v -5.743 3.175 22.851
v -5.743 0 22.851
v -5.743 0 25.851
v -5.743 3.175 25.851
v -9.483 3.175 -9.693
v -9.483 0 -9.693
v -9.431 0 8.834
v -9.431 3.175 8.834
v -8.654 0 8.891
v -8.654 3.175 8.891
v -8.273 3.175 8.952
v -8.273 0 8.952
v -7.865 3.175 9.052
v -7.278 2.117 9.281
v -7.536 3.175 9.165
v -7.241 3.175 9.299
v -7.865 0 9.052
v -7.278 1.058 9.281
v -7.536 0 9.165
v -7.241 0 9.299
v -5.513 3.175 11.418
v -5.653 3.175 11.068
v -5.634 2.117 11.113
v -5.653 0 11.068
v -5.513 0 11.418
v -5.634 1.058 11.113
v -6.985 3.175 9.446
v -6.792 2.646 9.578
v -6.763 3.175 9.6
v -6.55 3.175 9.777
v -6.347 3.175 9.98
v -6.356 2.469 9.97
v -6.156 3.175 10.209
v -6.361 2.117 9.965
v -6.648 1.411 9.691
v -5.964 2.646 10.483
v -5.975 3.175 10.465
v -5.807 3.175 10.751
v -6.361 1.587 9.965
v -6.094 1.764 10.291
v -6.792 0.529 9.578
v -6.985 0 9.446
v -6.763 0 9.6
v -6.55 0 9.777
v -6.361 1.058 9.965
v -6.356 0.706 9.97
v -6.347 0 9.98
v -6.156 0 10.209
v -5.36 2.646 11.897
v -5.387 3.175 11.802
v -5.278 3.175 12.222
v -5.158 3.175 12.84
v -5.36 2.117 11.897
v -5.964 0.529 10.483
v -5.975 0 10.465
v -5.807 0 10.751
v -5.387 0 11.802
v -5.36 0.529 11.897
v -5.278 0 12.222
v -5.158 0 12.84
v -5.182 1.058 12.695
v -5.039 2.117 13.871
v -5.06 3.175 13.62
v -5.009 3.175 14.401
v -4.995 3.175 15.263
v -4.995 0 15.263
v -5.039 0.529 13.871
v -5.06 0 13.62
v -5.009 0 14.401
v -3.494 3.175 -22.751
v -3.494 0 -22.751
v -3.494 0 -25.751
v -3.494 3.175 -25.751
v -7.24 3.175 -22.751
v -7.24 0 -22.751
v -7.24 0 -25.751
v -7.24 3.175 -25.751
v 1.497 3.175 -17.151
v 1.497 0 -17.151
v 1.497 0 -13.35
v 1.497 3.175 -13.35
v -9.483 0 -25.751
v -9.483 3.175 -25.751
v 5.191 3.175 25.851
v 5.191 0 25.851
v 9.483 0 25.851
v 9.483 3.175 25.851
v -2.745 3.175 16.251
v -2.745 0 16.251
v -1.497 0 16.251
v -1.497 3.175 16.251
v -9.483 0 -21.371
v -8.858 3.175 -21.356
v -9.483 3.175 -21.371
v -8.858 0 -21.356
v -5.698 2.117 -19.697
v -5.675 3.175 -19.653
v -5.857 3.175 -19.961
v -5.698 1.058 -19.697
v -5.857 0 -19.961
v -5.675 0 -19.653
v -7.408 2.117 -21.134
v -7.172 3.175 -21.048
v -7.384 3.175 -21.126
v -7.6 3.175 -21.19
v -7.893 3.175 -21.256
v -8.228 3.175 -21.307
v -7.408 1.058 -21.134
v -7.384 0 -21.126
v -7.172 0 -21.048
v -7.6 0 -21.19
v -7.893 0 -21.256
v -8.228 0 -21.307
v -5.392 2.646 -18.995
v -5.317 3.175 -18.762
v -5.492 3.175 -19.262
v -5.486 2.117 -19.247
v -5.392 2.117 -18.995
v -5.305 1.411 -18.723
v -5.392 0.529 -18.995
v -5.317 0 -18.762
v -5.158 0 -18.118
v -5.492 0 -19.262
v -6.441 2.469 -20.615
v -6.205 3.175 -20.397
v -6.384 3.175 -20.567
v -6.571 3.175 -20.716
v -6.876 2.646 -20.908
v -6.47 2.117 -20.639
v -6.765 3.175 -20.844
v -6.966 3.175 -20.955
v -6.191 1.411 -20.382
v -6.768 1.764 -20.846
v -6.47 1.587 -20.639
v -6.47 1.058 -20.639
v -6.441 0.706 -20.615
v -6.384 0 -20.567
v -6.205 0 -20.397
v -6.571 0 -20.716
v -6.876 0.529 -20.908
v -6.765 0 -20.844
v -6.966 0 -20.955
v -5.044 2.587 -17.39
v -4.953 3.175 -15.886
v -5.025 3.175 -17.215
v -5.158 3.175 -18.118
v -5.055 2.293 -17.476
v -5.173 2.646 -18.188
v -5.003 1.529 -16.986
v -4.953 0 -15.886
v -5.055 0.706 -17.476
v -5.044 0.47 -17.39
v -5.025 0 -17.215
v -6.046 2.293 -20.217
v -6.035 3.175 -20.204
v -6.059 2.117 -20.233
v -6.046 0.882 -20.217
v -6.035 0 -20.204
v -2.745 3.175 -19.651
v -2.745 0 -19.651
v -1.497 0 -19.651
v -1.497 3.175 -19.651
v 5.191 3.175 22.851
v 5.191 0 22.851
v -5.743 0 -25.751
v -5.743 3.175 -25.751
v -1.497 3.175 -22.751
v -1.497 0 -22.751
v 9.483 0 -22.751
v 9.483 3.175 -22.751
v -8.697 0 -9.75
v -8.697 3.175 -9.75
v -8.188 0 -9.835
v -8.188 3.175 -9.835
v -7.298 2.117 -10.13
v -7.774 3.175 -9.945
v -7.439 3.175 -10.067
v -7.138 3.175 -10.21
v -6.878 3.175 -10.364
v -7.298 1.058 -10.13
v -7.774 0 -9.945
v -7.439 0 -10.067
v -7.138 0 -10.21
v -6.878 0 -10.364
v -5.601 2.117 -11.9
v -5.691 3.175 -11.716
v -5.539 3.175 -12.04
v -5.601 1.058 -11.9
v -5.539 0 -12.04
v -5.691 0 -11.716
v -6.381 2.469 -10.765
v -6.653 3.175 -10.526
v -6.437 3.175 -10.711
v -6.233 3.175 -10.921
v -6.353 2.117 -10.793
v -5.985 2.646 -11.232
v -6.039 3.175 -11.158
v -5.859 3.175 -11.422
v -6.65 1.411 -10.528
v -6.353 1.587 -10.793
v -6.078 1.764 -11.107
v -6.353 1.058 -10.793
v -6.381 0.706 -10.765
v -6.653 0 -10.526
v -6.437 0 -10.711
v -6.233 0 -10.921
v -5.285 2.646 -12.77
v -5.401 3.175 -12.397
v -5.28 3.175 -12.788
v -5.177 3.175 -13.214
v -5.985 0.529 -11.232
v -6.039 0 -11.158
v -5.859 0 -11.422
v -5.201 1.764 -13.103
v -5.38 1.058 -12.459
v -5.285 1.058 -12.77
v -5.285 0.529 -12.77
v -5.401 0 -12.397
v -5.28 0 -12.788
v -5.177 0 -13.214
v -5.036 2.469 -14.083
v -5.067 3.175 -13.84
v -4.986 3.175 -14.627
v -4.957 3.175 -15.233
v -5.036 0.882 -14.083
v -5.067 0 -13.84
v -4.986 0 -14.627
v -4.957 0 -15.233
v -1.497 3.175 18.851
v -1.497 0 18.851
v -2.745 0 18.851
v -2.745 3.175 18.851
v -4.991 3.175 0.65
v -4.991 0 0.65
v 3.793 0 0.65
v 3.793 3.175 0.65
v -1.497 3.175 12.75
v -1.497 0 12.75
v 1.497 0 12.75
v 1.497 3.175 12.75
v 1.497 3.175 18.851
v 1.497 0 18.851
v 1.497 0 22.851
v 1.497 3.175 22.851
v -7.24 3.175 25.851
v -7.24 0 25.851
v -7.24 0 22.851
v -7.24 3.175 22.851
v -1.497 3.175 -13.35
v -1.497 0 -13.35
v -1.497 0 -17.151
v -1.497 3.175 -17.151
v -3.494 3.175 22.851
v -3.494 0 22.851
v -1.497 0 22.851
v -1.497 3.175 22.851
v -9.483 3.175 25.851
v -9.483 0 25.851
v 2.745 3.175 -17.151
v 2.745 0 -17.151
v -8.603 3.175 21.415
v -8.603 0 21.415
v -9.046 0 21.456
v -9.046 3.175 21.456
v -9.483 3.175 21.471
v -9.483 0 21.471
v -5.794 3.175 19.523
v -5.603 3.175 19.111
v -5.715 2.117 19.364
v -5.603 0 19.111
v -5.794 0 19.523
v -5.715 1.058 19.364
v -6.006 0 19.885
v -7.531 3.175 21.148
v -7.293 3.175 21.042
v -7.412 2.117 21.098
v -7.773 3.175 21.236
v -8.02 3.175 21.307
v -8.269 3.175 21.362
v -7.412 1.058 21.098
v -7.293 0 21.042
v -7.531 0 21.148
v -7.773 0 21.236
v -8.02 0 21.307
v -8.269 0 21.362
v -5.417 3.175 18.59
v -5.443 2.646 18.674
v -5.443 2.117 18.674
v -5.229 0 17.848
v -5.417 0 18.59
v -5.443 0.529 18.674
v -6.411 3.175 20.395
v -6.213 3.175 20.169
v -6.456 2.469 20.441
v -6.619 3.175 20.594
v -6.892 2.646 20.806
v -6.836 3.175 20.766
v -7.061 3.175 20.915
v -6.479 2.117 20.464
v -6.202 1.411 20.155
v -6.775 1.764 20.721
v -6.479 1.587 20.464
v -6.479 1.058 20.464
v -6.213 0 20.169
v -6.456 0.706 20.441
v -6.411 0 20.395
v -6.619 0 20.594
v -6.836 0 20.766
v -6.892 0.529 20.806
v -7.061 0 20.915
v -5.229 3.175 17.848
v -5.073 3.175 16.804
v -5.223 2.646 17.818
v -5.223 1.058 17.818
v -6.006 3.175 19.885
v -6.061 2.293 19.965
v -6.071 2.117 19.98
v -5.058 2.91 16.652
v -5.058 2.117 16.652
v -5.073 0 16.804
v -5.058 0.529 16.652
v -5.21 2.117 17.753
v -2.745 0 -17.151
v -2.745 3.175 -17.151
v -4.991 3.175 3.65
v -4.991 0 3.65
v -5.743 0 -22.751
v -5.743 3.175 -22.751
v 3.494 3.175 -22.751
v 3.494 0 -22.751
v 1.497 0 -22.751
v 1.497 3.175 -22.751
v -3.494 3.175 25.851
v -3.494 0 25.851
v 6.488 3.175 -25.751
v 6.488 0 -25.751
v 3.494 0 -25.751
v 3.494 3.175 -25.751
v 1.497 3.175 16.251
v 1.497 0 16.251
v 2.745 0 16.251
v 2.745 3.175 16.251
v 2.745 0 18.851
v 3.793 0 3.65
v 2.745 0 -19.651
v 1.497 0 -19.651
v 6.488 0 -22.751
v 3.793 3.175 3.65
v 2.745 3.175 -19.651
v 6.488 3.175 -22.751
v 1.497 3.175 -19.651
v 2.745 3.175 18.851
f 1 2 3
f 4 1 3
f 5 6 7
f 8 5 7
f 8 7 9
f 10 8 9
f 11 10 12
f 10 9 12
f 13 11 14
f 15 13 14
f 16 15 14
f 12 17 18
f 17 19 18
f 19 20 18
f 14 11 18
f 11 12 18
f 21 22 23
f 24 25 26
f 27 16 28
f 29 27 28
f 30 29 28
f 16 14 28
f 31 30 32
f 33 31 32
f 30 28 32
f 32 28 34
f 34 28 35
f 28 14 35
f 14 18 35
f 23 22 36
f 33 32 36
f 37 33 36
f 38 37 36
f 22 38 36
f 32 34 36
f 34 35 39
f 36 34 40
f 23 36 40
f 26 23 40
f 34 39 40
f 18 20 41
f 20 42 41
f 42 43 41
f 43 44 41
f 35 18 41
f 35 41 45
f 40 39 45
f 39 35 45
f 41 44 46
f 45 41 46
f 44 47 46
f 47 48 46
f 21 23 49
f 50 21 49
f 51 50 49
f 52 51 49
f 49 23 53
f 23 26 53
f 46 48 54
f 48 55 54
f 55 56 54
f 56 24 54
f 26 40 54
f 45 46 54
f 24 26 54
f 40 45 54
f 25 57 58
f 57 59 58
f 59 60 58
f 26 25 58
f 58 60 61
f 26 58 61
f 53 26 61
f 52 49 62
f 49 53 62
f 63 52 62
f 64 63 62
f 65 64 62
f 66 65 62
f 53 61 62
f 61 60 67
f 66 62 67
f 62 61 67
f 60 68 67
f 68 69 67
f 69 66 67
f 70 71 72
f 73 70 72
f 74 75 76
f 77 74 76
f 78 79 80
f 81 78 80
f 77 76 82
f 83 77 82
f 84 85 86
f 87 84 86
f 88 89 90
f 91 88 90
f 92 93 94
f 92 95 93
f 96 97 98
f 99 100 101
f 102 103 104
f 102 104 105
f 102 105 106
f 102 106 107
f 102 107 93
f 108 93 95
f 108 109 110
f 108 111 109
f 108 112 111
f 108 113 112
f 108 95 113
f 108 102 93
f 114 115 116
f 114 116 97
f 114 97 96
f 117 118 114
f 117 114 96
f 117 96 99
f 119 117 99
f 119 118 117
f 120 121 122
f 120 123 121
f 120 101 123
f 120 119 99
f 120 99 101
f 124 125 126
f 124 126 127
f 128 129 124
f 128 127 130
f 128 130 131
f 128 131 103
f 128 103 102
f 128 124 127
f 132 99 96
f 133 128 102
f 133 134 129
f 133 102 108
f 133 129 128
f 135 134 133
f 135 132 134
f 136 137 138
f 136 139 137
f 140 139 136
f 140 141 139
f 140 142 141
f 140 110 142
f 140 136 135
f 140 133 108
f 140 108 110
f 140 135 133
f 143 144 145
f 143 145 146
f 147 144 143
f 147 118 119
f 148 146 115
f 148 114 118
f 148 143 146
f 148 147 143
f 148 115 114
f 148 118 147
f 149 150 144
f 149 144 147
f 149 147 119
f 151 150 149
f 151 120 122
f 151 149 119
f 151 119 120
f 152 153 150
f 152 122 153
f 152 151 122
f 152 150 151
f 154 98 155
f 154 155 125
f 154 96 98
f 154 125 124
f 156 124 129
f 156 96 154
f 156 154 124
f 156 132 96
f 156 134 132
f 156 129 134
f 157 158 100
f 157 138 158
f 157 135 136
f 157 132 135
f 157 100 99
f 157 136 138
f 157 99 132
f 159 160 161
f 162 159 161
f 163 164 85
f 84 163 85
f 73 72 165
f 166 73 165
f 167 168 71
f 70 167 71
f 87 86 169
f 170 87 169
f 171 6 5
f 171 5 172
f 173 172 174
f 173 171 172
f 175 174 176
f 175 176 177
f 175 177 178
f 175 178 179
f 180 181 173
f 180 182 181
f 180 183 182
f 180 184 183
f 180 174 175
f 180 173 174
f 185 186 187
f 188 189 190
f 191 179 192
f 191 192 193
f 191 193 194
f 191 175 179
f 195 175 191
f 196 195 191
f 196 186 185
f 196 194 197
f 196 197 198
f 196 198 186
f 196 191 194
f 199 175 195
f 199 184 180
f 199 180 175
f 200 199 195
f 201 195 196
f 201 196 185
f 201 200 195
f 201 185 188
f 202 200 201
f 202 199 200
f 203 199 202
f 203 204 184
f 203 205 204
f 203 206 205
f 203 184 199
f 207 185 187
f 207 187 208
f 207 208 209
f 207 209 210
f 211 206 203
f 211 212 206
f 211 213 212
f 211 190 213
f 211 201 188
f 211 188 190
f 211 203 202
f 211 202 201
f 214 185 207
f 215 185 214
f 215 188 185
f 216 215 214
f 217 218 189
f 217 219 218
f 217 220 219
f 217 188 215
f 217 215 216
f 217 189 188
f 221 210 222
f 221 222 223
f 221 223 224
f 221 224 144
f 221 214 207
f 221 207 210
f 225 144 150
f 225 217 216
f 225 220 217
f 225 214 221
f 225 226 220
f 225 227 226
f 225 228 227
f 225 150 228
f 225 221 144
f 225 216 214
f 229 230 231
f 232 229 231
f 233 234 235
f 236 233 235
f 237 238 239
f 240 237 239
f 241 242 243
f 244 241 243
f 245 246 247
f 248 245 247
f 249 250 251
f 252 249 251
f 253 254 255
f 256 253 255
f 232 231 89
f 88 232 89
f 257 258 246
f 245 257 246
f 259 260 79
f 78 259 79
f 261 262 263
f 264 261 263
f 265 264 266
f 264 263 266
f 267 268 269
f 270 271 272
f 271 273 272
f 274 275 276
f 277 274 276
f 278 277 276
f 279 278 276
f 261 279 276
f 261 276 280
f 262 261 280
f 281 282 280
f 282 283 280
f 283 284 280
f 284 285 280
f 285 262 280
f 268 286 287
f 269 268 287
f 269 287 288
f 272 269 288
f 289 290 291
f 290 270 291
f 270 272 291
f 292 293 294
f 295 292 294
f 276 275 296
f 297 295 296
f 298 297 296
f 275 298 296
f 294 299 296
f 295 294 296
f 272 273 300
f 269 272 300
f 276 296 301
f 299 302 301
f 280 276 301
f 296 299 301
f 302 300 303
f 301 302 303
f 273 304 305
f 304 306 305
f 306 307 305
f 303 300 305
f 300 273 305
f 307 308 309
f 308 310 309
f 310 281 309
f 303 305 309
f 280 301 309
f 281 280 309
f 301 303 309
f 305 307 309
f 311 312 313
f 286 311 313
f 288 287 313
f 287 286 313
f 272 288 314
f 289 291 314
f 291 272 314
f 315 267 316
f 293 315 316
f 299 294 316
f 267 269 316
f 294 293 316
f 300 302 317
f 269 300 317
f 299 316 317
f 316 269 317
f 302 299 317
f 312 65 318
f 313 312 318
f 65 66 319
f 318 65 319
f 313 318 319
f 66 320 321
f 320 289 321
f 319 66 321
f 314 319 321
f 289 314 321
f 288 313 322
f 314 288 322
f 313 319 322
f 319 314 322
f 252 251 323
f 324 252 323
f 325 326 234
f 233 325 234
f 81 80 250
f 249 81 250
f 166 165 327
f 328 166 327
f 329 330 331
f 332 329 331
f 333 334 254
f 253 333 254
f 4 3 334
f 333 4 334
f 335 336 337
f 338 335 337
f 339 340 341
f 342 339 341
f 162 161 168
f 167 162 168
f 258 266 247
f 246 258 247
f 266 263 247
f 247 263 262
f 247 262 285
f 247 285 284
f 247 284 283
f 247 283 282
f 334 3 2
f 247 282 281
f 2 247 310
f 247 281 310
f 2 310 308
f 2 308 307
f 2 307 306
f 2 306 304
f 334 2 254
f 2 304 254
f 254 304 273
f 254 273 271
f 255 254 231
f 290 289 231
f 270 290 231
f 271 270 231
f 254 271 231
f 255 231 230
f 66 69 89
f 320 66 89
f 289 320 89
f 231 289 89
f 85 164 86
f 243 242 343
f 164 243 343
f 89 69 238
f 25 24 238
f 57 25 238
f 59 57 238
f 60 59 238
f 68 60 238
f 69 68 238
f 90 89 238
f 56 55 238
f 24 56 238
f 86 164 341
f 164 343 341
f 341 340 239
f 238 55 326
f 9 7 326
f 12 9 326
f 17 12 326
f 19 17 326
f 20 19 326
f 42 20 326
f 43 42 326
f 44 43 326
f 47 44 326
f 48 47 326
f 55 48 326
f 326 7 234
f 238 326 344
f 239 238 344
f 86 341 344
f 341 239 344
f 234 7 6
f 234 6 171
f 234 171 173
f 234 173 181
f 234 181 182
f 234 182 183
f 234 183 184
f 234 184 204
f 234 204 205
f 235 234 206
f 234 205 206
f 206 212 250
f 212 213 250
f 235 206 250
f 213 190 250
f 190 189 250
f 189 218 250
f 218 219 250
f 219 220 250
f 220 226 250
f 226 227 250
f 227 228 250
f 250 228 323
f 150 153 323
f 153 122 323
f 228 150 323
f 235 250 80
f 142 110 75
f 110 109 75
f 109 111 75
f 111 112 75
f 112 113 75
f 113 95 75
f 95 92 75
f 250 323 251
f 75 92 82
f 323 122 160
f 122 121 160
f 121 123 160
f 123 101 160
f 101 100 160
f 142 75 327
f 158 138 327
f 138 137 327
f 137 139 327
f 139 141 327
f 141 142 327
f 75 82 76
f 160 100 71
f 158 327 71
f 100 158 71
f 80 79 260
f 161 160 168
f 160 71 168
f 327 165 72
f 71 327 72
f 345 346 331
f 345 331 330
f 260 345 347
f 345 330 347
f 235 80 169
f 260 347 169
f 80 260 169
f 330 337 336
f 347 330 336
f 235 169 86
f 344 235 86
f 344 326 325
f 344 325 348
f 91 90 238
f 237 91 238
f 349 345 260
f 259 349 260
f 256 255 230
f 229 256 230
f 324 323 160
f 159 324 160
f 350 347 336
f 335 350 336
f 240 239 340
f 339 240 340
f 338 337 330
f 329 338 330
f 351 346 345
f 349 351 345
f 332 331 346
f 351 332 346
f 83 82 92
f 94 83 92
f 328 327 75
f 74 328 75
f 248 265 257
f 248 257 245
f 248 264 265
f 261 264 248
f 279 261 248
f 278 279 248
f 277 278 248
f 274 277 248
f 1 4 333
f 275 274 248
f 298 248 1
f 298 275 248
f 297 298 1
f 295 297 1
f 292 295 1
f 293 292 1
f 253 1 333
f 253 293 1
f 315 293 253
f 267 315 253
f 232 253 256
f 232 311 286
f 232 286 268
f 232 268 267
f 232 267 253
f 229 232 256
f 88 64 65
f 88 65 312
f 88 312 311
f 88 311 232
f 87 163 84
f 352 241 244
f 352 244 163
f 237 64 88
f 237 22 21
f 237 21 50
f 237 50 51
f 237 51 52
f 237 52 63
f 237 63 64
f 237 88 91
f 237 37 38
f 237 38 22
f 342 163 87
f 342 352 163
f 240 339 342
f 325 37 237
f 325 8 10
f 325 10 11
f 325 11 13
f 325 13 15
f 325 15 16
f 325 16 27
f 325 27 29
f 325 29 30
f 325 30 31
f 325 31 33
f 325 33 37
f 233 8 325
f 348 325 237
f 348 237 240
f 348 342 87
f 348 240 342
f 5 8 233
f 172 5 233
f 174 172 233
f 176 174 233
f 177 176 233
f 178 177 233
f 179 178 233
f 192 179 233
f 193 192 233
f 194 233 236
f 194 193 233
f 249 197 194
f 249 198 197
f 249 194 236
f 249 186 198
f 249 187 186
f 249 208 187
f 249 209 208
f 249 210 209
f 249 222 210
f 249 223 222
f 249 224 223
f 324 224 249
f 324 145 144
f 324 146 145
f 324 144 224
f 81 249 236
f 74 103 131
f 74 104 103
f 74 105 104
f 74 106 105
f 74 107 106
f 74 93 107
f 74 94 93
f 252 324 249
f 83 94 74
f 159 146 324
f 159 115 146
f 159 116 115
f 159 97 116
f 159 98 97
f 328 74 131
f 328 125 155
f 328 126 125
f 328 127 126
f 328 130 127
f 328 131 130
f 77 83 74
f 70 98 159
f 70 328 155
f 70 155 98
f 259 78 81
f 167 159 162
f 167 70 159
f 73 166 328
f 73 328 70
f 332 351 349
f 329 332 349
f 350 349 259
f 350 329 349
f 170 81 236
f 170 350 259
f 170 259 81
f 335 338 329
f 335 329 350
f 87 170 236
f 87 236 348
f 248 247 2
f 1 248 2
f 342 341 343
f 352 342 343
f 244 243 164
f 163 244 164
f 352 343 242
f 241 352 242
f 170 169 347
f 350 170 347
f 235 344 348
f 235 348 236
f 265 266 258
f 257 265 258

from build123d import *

# Parameters (mm, degrees)
SKETCH1_W           = 8.784371834
SKETCH1_H           = 3.000075643
BOSS_EXTRUDE1_DEPTH = 3.175


with BuildPart() as part:
    # Sketch1 → Boss-Extrude1 (new body)
    with BuildSketch(Plane(origin=(0, 0, 0), x_dir=(1, 0, 0), z_dir=(0, 1, 0))):
        with BuildLine():
            Line((-9.483120155, -21.470892841), (-9.483120155, -25.850971148))
            Line((-9.483120155, -25.850971148), (-7.240182549, -25.850971148))
            Line((-7.240182549, -25.850971148), (-7.240182549, -22.850827141))
            Line((-7.240182549, -22.850827141), (-5.742820851, -22.850827141))
            Line((-5.742820851, -22.850827141), (-5.742820851, -25.850971148))
            Line((-5.742820851, -25.850971148), (-3.493751351, -25.850971148))
            Line((-3.493751351, -25.850971148), (-3.493751351, -22.850827141))
            Line((-3.493751351, -22.850827141), (-1.497298333, -22.850827141))
            Line((-1.497298333, -22.850827141), (-1.497298333, -18.850679894))
            Line((-1.497298333, -18.850679894), (-2.745036382, -18.850679894))
            Line((-2.745036382, -18.850679894), (-2.745036382, -18.750702276))
            Line((-2.745036382, -18.750702276), (-2.745036382, -16.250563552))
            Line((-2.745036382, -16.250563552), (-1.497298333, -16.250563552))
            Line((-1.497298333, -16.250563552), (-1.497298333, -12.750414262))
            Line((-1.497298333, -12.750414262), (1.49723009, -12.750414262))
            Line((1.49723009, -12.750414262), (1.49723009, -16.250563552))
            Line((1.49723009, -16.250563552), (2.745046129, -16.250563552))
            Line((2.745046129, -16.250563552), (2.745046129, -18.750702276))
            Line((2.745046129, -18.750702276), (2.745046129, -18.850679894))
            Line((2.745046129, -18.850679894), (1.49723009, -18.850679894))
            Line((1.49723009, -18.850679894), (1.49723009, -22.850827141))
            Line((1.49723009, -22.850827141), (5.190823665, -22.850827141))
            Line((5.190823665, -22.850827141), (5.190823665, -25.850971148))
            Line((5.190823665, -25.850971148), (9.483120155, -25.850971148))
            Line((9.483120155, -25.850971148), (9.483120155, 22.750856849))
            Line((9.483120155, 22.750856849), (6.488418889, 22.750856849))
            Line((6.488418889, 22.750856849), (6.488418889, 25.750995973))
            Line((6.488418889, 25.750995973), (3.493705241, 25.750995973))
            Line((3.493705241, 25.750995973), (3.493705241, 22.750856849))
            Line((3.493705241, 22.750856849), (1.497242474, 22.750856849))
            Line((1.497242474, 22.750856849), (1.497242474, 19.650735225))
            Line((1.497242474, 19.650735225), (2.745058512, 19.650735225))
            Line((2.745058512, 19.650735225), (2.745058512, 17.150659981))
            Line((2.745058512, 17.150659981), (1.497242474, 17.150659981))
            Line((1.497242474, 17.150659981), (1.497242474, 13.350397163))
            Line((1.497242474, 13.350397163), (-1.497285949, 13.350397163))
            Line((-1.497285949, 13.350397163), (-1.497285949, 17.150659981))
            Line((-1.497285949, 17.150659981), (-2.745023998, 17.150659981))
            Line((-2.745023998, 17.150659981), (-2.745023998, 19.650735225))
            Line((-2.745023998, 19.650735225), (-1.497285949, 19.650735225))
            Line((-1.497285949, 19.650735225), (-1.497285949, 22.750856849))
            Line((-1.497285949, 22.750856849), (-3.493751349, 22.750856849))
            Line((-3.493751349, 22.750856849), (-3.493751349, 25.750995973))
            Line((-3.493751349, 25.750995973), (-5.742820849, 25.750995973))
            Line((-5.742820849, 25.750995973), (-5.742820849, 22.750856849))
            Line((-5.742820849, 22.750856849), (-7.240182547, 22.750856849))
            Line((-7.240182547, 22.750856849), (-7.240182547, 25.750995973))
            Line((-7.240182547, 25.750995973), (-9.483120153, 25.750995973))
            Line((-9.483120153, 25.750995973), (-9.483120153, 21.370917666))
            add(Edge.make_bspline(
                [(-4.952518186, 15.886251248), (-5.015201934, 21.274211759), (-7.426547278, 21.343845481), (-9.483120153, 21.370917666)],
                knots=[6, 6, 6, 6, 7, 7, 7, 7], degree=3))
            add(Edge.make_bspline(
                [(-9.483120153, 9.692990904), (-7.240182547, 9.757380123), (-4.889844186, 10.498168659), (-4.952518186, 15.886251248)],
                knots=[5, 5, 5, 5, 6, 6, 6, 6], degree=3))
            Line((-9.483120153, 9.692990904), (-9.431179406, -8.834115587))
            add(Edge.make_bspline(
                [(-9.431179406, -8.834115587), (-7.188183308, -8.898499923), (-4.965366893, -9.64325846), (-4.995070997, -15.262909799)],
                knots=[1, 1, 1, 1, 2, 2, 2, 2], degree=3))
            add(Edge.make_bspline(
                [(-4.995070997, -15.262909799), (-5.024784848, -20.882307214), (-7.42654728, -21.443818214), (-9.483120155, -21.470892841)],
                knots=[2, 2, 2, 2, 3, 3, 3, 3], degree=3))
        make_face()
        with Locations((-0.598927132, -2.150035167)):
            Rectangle(SKETCH1_W, SKETCH1_H, mode=Mode.SUBTRACT)
    extrude(amount=BOSS_EXTRUDE1_DEPTH)


solid = part.part
